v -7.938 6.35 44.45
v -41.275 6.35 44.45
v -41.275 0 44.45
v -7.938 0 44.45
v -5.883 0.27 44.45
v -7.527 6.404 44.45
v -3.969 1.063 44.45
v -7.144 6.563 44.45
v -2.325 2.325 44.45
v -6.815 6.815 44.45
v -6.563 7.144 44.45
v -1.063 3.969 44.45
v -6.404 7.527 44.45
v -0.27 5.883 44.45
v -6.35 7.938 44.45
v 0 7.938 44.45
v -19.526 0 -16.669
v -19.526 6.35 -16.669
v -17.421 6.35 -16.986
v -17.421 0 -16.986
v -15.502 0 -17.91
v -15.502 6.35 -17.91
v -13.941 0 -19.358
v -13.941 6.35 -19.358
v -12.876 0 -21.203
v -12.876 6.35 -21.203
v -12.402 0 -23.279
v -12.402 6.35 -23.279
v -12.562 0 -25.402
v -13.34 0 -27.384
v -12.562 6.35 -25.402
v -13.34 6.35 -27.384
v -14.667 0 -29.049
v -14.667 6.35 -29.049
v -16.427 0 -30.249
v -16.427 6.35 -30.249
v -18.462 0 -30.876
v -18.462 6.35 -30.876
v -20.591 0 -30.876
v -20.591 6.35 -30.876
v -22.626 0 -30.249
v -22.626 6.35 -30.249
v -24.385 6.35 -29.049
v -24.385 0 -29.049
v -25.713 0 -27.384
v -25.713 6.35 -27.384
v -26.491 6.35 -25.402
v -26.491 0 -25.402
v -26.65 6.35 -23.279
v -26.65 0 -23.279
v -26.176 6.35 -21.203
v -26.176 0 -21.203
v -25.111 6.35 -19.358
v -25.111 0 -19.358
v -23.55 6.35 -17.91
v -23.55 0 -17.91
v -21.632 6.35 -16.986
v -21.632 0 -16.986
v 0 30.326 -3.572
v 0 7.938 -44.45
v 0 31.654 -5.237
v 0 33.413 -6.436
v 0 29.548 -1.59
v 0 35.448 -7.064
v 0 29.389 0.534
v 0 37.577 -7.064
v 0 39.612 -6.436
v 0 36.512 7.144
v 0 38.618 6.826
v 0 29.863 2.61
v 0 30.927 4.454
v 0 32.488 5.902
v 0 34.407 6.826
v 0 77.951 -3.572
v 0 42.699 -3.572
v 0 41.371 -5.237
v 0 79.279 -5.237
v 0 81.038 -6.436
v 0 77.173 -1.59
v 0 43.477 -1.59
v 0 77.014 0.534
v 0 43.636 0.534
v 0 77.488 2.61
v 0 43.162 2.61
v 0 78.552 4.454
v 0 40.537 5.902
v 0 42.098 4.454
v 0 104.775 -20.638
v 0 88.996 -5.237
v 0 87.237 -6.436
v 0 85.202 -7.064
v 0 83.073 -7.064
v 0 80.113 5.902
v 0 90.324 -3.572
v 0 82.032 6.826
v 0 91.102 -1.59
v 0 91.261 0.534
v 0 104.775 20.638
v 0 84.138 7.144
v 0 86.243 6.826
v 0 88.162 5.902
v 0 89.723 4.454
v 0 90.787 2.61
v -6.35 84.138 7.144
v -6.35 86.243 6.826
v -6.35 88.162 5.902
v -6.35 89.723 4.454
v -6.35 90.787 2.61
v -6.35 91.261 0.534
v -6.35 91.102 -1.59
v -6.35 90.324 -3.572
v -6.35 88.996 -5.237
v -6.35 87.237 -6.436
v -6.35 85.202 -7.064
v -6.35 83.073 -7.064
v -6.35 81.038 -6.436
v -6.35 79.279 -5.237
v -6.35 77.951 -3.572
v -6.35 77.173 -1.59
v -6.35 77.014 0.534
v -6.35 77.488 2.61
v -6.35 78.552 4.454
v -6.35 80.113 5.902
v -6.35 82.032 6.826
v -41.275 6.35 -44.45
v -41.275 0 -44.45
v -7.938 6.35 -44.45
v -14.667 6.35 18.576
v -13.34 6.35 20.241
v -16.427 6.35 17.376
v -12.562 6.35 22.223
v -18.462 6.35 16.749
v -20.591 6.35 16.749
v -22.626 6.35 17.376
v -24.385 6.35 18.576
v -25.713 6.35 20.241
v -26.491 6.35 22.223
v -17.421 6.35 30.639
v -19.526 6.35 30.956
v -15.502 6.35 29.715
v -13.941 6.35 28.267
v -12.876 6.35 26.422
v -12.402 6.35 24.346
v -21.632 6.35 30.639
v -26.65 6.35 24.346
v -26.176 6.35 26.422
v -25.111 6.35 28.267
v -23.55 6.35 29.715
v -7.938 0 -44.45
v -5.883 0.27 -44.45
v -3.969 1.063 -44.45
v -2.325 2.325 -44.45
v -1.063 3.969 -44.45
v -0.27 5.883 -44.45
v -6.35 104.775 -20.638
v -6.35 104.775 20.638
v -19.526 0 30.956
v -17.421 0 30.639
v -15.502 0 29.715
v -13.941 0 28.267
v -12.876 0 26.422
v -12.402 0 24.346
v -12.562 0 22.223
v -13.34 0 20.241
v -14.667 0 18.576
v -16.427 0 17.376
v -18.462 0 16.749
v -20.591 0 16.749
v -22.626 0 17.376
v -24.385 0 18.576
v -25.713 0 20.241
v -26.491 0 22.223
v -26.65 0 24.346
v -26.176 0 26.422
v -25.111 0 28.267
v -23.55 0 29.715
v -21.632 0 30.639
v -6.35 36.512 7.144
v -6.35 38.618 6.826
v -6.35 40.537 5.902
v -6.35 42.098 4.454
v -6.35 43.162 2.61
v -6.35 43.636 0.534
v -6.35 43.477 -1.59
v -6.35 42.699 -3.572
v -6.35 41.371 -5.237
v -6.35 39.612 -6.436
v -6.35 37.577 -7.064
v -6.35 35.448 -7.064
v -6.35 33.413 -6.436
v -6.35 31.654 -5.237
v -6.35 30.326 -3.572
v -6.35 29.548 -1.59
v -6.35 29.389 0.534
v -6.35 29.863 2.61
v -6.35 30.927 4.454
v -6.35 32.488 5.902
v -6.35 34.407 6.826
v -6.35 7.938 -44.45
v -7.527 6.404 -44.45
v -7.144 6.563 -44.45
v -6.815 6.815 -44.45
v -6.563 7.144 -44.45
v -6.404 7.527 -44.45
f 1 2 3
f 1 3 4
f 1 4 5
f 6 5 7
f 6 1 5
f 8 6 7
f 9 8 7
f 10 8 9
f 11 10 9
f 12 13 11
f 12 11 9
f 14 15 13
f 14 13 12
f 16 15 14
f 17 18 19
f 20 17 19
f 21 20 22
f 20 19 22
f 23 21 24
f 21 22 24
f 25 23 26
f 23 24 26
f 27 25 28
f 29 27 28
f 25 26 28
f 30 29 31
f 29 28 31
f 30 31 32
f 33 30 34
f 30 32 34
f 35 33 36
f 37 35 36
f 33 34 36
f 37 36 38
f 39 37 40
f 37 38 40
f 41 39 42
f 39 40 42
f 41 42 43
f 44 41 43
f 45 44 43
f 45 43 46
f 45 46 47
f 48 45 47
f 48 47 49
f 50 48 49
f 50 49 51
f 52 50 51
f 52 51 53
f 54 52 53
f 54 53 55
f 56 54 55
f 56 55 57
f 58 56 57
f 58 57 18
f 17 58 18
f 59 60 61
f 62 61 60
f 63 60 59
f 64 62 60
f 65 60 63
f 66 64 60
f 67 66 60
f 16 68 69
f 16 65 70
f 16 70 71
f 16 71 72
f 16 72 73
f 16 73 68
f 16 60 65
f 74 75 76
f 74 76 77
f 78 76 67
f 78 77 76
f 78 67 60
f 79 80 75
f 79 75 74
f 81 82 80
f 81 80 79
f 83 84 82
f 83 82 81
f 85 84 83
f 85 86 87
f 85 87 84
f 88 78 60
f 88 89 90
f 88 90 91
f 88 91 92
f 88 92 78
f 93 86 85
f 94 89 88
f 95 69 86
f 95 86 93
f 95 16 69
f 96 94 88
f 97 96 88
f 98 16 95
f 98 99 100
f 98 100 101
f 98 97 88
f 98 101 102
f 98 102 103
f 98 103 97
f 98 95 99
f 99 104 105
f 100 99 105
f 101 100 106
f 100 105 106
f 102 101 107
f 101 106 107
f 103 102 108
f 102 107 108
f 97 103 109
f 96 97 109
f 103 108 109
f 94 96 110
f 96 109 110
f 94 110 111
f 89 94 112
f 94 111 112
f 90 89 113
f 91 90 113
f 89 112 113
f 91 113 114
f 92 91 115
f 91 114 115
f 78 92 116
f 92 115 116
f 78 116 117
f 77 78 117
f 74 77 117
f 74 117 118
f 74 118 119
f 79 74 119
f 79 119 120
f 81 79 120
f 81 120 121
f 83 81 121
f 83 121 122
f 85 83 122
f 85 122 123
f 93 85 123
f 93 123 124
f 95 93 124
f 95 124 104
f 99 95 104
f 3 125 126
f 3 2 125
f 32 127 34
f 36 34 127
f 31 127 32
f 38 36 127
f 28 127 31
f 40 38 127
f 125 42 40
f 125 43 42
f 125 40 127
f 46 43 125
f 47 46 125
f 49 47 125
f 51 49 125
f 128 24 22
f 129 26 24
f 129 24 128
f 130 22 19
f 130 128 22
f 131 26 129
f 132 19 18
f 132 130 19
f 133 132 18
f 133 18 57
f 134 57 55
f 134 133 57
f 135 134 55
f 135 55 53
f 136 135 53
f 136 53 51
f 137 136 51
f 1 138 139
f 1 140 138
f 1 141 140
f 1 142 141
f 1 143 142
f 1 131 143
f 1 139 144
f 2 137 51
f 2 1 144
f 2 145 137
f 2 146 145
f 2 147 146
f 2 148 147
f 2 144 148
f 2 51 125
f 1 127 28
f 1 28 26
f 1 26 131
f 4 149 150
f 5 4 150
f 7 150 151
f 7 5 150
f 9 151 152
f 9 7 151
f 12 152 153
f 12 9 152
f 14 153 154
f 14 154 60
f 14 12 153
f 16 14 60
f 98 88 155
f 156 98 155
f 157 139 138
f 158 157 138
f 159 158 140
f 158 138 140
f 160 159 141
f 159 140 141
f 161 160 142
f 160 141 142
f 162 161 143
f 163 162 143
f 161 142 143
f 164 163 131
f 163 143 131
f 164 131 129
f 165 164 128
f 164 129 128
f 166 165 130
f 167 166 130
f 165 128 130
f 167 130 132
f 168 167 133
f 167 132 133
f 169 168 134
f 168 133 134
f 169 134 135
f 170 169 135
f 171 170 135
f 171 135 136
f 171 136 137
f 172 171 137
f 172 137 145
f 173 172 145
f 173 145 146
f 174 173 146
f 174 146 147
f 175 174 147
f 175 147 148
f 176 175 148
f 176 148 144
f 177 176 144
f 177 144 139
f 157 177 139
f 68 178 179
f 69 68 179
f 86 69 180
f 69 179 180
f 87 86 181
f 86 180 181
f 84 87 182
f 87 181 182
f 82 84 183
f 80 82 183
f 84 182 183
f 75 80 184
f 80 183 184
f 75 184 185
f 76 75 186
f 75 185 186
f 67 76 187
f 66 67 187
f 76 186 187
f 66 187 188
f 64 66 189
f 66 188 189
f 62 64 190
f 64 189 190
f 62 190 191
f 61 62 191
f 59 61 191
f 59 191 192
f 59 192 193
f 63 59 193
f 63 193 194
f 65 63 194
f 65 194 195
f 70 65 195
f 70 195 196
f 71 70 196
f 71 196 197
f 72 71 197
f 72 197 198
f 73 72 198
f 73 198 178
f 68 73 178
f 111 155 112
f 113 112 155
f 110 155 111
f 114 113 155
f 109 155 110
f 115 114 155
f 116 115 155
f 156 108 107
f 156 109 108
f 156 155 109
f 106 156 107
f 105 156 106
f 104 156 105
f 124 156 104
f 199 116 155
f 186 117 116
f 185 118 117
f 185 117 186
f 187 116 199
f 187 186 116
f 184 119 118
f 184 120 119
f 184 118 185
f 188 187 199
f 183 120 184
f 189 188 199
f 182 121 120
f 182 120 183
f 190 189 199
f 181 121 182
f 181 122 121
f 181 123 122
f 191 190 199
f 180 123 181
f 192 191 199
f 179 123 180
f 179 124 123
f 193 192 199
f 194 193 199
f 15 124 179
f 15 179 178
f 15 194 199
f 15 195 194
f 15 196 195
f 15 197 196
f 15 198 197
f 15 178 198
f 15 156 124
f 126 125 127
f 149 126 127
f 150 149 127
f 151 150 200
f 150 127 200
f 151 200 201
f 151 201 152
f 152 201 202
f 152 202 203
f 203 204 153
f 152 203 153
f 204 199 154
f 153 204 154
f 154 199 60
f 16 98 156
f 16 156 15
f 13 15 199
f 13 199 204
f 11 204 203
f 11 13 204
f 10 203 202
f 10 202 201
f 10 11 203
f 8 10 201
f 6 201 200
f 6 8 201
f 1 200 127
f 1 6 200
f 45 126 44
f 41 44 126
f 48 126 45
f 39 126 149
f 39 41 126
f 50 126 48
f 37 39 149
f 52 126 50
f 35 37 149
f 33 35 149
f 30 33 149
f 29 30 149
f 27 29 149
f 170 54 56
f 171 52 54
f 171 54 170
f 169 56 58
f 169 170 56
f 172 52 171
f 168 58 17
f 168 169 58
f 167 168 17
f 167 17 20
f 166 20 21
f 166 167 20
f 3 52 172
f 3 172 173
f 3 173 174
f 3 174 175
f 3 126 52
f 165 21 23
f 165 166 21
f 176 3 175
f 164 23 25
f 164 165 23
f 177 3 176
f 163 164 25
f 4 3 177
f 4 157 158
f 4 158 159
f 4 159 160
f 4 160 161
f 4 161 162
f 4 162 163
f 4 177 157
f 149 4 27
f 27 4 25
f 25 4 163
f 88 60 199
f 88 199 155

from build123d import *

# Parameters (mm, degrees)
EXTRUDE_THIN1_DEPTH     = 44.45
CUT_EXTRUDE2_DEPTH      = 120.051916196
CUT_EXTRUDE2_DEPTH_BACK = 120.051916196
SKETCH3_R               = 7.14375
CUT_EXTRUDE3_DEPTH      = 120.051916196
SKETCH4_R               = 7.14375
CUT_EXTRUDE4_DEPTH      = 116.615348246


with BuildPart() as part:
    # Sketch1 → Extrude-Thin1 (new, symmetric)
    with BuildSketch(Plane.XY):
        with BuildLine():
            Line((-41.275, 0), (-7.9375, 0))
            ThreePointArc((-7.9375, 0), (-2.324839924, 2.324839924), (0, 7.9375))
            Line((0, 7.9375), (0, 104.775))
            Line((0, 104.775), (-6.35, 104.775))
            Line((-6.35, 104.775), (-6.35, 7.9375))
            ThreePointArc((-6.35, 7.9375), (-6.814967985, 6.814967985), (-7.9375, 6.35))
            Line((-7.9375, 6.35), (-41.275, 6.35))
            Line((-41.275, 6.35), (-41.275, 0))
        make_face()
    extrude(amount=EXTRUDE_THIN1_DEPTH, both=True)

    # Sketch2 → Cut-Extrude2 (cut, two sides: drawn at the far end of the back side and taken through both)
    with BuildSketch(Plane.ZY.offset(6.35).offset(-CUT_EXTRUDE2_DEPTH_BACK)):
        Polygon((-109.618200913, -257.07985038), (-44.45, 7.9375), (-20.6375, 104.775), (20.6375, 104.775), (44.45, 7.9375), (109.618200913, -257.07985038), (109.618200913, 288.744628415), (-109.618200913, 288.744628415), align=None)
    extrude(amount=CUT_EXTRUDE2_DEPTH + CUT_EXTRUDE2_DEPTH_BACK, mode=Mode.SUBTRACT)

    # Sketch3 → Cut-Extrude3 (cut, through all)
    with BuildSketch(Plane.ZY.offset(6.35)):
        with Locations((0, 84.1375)):
            Circle(SKETCH3_R)
        with Locations((0, 36.5125)):
            Circle(SKETCH3_R)
    extrude(amount=-CUT_EXTRUDE3_DEPTH, mode=Mode.SUBTRACT)

    # Sketch4 → Cut-Extrude4 (cut, through all)
    with BuildSketch(Plane(origin=(0, 6.35, 0), x_dir=(1, 0, 0), z_dir=(0, 1, 0))):
        with Locations(Location((-19.52625, 23.8125, 0), (0, 0, 270))):
            Circle(SKETCH4_R)
        with Locations(Location((-19.52625, -23.8125, 0), (0, 0, 270))):
            Circle(SKETCH4_R)
    extrude(amount=-CUT_EXTRUDE4_DEPTH, mode=Mode.SUBTRACT)


solid = part.part
